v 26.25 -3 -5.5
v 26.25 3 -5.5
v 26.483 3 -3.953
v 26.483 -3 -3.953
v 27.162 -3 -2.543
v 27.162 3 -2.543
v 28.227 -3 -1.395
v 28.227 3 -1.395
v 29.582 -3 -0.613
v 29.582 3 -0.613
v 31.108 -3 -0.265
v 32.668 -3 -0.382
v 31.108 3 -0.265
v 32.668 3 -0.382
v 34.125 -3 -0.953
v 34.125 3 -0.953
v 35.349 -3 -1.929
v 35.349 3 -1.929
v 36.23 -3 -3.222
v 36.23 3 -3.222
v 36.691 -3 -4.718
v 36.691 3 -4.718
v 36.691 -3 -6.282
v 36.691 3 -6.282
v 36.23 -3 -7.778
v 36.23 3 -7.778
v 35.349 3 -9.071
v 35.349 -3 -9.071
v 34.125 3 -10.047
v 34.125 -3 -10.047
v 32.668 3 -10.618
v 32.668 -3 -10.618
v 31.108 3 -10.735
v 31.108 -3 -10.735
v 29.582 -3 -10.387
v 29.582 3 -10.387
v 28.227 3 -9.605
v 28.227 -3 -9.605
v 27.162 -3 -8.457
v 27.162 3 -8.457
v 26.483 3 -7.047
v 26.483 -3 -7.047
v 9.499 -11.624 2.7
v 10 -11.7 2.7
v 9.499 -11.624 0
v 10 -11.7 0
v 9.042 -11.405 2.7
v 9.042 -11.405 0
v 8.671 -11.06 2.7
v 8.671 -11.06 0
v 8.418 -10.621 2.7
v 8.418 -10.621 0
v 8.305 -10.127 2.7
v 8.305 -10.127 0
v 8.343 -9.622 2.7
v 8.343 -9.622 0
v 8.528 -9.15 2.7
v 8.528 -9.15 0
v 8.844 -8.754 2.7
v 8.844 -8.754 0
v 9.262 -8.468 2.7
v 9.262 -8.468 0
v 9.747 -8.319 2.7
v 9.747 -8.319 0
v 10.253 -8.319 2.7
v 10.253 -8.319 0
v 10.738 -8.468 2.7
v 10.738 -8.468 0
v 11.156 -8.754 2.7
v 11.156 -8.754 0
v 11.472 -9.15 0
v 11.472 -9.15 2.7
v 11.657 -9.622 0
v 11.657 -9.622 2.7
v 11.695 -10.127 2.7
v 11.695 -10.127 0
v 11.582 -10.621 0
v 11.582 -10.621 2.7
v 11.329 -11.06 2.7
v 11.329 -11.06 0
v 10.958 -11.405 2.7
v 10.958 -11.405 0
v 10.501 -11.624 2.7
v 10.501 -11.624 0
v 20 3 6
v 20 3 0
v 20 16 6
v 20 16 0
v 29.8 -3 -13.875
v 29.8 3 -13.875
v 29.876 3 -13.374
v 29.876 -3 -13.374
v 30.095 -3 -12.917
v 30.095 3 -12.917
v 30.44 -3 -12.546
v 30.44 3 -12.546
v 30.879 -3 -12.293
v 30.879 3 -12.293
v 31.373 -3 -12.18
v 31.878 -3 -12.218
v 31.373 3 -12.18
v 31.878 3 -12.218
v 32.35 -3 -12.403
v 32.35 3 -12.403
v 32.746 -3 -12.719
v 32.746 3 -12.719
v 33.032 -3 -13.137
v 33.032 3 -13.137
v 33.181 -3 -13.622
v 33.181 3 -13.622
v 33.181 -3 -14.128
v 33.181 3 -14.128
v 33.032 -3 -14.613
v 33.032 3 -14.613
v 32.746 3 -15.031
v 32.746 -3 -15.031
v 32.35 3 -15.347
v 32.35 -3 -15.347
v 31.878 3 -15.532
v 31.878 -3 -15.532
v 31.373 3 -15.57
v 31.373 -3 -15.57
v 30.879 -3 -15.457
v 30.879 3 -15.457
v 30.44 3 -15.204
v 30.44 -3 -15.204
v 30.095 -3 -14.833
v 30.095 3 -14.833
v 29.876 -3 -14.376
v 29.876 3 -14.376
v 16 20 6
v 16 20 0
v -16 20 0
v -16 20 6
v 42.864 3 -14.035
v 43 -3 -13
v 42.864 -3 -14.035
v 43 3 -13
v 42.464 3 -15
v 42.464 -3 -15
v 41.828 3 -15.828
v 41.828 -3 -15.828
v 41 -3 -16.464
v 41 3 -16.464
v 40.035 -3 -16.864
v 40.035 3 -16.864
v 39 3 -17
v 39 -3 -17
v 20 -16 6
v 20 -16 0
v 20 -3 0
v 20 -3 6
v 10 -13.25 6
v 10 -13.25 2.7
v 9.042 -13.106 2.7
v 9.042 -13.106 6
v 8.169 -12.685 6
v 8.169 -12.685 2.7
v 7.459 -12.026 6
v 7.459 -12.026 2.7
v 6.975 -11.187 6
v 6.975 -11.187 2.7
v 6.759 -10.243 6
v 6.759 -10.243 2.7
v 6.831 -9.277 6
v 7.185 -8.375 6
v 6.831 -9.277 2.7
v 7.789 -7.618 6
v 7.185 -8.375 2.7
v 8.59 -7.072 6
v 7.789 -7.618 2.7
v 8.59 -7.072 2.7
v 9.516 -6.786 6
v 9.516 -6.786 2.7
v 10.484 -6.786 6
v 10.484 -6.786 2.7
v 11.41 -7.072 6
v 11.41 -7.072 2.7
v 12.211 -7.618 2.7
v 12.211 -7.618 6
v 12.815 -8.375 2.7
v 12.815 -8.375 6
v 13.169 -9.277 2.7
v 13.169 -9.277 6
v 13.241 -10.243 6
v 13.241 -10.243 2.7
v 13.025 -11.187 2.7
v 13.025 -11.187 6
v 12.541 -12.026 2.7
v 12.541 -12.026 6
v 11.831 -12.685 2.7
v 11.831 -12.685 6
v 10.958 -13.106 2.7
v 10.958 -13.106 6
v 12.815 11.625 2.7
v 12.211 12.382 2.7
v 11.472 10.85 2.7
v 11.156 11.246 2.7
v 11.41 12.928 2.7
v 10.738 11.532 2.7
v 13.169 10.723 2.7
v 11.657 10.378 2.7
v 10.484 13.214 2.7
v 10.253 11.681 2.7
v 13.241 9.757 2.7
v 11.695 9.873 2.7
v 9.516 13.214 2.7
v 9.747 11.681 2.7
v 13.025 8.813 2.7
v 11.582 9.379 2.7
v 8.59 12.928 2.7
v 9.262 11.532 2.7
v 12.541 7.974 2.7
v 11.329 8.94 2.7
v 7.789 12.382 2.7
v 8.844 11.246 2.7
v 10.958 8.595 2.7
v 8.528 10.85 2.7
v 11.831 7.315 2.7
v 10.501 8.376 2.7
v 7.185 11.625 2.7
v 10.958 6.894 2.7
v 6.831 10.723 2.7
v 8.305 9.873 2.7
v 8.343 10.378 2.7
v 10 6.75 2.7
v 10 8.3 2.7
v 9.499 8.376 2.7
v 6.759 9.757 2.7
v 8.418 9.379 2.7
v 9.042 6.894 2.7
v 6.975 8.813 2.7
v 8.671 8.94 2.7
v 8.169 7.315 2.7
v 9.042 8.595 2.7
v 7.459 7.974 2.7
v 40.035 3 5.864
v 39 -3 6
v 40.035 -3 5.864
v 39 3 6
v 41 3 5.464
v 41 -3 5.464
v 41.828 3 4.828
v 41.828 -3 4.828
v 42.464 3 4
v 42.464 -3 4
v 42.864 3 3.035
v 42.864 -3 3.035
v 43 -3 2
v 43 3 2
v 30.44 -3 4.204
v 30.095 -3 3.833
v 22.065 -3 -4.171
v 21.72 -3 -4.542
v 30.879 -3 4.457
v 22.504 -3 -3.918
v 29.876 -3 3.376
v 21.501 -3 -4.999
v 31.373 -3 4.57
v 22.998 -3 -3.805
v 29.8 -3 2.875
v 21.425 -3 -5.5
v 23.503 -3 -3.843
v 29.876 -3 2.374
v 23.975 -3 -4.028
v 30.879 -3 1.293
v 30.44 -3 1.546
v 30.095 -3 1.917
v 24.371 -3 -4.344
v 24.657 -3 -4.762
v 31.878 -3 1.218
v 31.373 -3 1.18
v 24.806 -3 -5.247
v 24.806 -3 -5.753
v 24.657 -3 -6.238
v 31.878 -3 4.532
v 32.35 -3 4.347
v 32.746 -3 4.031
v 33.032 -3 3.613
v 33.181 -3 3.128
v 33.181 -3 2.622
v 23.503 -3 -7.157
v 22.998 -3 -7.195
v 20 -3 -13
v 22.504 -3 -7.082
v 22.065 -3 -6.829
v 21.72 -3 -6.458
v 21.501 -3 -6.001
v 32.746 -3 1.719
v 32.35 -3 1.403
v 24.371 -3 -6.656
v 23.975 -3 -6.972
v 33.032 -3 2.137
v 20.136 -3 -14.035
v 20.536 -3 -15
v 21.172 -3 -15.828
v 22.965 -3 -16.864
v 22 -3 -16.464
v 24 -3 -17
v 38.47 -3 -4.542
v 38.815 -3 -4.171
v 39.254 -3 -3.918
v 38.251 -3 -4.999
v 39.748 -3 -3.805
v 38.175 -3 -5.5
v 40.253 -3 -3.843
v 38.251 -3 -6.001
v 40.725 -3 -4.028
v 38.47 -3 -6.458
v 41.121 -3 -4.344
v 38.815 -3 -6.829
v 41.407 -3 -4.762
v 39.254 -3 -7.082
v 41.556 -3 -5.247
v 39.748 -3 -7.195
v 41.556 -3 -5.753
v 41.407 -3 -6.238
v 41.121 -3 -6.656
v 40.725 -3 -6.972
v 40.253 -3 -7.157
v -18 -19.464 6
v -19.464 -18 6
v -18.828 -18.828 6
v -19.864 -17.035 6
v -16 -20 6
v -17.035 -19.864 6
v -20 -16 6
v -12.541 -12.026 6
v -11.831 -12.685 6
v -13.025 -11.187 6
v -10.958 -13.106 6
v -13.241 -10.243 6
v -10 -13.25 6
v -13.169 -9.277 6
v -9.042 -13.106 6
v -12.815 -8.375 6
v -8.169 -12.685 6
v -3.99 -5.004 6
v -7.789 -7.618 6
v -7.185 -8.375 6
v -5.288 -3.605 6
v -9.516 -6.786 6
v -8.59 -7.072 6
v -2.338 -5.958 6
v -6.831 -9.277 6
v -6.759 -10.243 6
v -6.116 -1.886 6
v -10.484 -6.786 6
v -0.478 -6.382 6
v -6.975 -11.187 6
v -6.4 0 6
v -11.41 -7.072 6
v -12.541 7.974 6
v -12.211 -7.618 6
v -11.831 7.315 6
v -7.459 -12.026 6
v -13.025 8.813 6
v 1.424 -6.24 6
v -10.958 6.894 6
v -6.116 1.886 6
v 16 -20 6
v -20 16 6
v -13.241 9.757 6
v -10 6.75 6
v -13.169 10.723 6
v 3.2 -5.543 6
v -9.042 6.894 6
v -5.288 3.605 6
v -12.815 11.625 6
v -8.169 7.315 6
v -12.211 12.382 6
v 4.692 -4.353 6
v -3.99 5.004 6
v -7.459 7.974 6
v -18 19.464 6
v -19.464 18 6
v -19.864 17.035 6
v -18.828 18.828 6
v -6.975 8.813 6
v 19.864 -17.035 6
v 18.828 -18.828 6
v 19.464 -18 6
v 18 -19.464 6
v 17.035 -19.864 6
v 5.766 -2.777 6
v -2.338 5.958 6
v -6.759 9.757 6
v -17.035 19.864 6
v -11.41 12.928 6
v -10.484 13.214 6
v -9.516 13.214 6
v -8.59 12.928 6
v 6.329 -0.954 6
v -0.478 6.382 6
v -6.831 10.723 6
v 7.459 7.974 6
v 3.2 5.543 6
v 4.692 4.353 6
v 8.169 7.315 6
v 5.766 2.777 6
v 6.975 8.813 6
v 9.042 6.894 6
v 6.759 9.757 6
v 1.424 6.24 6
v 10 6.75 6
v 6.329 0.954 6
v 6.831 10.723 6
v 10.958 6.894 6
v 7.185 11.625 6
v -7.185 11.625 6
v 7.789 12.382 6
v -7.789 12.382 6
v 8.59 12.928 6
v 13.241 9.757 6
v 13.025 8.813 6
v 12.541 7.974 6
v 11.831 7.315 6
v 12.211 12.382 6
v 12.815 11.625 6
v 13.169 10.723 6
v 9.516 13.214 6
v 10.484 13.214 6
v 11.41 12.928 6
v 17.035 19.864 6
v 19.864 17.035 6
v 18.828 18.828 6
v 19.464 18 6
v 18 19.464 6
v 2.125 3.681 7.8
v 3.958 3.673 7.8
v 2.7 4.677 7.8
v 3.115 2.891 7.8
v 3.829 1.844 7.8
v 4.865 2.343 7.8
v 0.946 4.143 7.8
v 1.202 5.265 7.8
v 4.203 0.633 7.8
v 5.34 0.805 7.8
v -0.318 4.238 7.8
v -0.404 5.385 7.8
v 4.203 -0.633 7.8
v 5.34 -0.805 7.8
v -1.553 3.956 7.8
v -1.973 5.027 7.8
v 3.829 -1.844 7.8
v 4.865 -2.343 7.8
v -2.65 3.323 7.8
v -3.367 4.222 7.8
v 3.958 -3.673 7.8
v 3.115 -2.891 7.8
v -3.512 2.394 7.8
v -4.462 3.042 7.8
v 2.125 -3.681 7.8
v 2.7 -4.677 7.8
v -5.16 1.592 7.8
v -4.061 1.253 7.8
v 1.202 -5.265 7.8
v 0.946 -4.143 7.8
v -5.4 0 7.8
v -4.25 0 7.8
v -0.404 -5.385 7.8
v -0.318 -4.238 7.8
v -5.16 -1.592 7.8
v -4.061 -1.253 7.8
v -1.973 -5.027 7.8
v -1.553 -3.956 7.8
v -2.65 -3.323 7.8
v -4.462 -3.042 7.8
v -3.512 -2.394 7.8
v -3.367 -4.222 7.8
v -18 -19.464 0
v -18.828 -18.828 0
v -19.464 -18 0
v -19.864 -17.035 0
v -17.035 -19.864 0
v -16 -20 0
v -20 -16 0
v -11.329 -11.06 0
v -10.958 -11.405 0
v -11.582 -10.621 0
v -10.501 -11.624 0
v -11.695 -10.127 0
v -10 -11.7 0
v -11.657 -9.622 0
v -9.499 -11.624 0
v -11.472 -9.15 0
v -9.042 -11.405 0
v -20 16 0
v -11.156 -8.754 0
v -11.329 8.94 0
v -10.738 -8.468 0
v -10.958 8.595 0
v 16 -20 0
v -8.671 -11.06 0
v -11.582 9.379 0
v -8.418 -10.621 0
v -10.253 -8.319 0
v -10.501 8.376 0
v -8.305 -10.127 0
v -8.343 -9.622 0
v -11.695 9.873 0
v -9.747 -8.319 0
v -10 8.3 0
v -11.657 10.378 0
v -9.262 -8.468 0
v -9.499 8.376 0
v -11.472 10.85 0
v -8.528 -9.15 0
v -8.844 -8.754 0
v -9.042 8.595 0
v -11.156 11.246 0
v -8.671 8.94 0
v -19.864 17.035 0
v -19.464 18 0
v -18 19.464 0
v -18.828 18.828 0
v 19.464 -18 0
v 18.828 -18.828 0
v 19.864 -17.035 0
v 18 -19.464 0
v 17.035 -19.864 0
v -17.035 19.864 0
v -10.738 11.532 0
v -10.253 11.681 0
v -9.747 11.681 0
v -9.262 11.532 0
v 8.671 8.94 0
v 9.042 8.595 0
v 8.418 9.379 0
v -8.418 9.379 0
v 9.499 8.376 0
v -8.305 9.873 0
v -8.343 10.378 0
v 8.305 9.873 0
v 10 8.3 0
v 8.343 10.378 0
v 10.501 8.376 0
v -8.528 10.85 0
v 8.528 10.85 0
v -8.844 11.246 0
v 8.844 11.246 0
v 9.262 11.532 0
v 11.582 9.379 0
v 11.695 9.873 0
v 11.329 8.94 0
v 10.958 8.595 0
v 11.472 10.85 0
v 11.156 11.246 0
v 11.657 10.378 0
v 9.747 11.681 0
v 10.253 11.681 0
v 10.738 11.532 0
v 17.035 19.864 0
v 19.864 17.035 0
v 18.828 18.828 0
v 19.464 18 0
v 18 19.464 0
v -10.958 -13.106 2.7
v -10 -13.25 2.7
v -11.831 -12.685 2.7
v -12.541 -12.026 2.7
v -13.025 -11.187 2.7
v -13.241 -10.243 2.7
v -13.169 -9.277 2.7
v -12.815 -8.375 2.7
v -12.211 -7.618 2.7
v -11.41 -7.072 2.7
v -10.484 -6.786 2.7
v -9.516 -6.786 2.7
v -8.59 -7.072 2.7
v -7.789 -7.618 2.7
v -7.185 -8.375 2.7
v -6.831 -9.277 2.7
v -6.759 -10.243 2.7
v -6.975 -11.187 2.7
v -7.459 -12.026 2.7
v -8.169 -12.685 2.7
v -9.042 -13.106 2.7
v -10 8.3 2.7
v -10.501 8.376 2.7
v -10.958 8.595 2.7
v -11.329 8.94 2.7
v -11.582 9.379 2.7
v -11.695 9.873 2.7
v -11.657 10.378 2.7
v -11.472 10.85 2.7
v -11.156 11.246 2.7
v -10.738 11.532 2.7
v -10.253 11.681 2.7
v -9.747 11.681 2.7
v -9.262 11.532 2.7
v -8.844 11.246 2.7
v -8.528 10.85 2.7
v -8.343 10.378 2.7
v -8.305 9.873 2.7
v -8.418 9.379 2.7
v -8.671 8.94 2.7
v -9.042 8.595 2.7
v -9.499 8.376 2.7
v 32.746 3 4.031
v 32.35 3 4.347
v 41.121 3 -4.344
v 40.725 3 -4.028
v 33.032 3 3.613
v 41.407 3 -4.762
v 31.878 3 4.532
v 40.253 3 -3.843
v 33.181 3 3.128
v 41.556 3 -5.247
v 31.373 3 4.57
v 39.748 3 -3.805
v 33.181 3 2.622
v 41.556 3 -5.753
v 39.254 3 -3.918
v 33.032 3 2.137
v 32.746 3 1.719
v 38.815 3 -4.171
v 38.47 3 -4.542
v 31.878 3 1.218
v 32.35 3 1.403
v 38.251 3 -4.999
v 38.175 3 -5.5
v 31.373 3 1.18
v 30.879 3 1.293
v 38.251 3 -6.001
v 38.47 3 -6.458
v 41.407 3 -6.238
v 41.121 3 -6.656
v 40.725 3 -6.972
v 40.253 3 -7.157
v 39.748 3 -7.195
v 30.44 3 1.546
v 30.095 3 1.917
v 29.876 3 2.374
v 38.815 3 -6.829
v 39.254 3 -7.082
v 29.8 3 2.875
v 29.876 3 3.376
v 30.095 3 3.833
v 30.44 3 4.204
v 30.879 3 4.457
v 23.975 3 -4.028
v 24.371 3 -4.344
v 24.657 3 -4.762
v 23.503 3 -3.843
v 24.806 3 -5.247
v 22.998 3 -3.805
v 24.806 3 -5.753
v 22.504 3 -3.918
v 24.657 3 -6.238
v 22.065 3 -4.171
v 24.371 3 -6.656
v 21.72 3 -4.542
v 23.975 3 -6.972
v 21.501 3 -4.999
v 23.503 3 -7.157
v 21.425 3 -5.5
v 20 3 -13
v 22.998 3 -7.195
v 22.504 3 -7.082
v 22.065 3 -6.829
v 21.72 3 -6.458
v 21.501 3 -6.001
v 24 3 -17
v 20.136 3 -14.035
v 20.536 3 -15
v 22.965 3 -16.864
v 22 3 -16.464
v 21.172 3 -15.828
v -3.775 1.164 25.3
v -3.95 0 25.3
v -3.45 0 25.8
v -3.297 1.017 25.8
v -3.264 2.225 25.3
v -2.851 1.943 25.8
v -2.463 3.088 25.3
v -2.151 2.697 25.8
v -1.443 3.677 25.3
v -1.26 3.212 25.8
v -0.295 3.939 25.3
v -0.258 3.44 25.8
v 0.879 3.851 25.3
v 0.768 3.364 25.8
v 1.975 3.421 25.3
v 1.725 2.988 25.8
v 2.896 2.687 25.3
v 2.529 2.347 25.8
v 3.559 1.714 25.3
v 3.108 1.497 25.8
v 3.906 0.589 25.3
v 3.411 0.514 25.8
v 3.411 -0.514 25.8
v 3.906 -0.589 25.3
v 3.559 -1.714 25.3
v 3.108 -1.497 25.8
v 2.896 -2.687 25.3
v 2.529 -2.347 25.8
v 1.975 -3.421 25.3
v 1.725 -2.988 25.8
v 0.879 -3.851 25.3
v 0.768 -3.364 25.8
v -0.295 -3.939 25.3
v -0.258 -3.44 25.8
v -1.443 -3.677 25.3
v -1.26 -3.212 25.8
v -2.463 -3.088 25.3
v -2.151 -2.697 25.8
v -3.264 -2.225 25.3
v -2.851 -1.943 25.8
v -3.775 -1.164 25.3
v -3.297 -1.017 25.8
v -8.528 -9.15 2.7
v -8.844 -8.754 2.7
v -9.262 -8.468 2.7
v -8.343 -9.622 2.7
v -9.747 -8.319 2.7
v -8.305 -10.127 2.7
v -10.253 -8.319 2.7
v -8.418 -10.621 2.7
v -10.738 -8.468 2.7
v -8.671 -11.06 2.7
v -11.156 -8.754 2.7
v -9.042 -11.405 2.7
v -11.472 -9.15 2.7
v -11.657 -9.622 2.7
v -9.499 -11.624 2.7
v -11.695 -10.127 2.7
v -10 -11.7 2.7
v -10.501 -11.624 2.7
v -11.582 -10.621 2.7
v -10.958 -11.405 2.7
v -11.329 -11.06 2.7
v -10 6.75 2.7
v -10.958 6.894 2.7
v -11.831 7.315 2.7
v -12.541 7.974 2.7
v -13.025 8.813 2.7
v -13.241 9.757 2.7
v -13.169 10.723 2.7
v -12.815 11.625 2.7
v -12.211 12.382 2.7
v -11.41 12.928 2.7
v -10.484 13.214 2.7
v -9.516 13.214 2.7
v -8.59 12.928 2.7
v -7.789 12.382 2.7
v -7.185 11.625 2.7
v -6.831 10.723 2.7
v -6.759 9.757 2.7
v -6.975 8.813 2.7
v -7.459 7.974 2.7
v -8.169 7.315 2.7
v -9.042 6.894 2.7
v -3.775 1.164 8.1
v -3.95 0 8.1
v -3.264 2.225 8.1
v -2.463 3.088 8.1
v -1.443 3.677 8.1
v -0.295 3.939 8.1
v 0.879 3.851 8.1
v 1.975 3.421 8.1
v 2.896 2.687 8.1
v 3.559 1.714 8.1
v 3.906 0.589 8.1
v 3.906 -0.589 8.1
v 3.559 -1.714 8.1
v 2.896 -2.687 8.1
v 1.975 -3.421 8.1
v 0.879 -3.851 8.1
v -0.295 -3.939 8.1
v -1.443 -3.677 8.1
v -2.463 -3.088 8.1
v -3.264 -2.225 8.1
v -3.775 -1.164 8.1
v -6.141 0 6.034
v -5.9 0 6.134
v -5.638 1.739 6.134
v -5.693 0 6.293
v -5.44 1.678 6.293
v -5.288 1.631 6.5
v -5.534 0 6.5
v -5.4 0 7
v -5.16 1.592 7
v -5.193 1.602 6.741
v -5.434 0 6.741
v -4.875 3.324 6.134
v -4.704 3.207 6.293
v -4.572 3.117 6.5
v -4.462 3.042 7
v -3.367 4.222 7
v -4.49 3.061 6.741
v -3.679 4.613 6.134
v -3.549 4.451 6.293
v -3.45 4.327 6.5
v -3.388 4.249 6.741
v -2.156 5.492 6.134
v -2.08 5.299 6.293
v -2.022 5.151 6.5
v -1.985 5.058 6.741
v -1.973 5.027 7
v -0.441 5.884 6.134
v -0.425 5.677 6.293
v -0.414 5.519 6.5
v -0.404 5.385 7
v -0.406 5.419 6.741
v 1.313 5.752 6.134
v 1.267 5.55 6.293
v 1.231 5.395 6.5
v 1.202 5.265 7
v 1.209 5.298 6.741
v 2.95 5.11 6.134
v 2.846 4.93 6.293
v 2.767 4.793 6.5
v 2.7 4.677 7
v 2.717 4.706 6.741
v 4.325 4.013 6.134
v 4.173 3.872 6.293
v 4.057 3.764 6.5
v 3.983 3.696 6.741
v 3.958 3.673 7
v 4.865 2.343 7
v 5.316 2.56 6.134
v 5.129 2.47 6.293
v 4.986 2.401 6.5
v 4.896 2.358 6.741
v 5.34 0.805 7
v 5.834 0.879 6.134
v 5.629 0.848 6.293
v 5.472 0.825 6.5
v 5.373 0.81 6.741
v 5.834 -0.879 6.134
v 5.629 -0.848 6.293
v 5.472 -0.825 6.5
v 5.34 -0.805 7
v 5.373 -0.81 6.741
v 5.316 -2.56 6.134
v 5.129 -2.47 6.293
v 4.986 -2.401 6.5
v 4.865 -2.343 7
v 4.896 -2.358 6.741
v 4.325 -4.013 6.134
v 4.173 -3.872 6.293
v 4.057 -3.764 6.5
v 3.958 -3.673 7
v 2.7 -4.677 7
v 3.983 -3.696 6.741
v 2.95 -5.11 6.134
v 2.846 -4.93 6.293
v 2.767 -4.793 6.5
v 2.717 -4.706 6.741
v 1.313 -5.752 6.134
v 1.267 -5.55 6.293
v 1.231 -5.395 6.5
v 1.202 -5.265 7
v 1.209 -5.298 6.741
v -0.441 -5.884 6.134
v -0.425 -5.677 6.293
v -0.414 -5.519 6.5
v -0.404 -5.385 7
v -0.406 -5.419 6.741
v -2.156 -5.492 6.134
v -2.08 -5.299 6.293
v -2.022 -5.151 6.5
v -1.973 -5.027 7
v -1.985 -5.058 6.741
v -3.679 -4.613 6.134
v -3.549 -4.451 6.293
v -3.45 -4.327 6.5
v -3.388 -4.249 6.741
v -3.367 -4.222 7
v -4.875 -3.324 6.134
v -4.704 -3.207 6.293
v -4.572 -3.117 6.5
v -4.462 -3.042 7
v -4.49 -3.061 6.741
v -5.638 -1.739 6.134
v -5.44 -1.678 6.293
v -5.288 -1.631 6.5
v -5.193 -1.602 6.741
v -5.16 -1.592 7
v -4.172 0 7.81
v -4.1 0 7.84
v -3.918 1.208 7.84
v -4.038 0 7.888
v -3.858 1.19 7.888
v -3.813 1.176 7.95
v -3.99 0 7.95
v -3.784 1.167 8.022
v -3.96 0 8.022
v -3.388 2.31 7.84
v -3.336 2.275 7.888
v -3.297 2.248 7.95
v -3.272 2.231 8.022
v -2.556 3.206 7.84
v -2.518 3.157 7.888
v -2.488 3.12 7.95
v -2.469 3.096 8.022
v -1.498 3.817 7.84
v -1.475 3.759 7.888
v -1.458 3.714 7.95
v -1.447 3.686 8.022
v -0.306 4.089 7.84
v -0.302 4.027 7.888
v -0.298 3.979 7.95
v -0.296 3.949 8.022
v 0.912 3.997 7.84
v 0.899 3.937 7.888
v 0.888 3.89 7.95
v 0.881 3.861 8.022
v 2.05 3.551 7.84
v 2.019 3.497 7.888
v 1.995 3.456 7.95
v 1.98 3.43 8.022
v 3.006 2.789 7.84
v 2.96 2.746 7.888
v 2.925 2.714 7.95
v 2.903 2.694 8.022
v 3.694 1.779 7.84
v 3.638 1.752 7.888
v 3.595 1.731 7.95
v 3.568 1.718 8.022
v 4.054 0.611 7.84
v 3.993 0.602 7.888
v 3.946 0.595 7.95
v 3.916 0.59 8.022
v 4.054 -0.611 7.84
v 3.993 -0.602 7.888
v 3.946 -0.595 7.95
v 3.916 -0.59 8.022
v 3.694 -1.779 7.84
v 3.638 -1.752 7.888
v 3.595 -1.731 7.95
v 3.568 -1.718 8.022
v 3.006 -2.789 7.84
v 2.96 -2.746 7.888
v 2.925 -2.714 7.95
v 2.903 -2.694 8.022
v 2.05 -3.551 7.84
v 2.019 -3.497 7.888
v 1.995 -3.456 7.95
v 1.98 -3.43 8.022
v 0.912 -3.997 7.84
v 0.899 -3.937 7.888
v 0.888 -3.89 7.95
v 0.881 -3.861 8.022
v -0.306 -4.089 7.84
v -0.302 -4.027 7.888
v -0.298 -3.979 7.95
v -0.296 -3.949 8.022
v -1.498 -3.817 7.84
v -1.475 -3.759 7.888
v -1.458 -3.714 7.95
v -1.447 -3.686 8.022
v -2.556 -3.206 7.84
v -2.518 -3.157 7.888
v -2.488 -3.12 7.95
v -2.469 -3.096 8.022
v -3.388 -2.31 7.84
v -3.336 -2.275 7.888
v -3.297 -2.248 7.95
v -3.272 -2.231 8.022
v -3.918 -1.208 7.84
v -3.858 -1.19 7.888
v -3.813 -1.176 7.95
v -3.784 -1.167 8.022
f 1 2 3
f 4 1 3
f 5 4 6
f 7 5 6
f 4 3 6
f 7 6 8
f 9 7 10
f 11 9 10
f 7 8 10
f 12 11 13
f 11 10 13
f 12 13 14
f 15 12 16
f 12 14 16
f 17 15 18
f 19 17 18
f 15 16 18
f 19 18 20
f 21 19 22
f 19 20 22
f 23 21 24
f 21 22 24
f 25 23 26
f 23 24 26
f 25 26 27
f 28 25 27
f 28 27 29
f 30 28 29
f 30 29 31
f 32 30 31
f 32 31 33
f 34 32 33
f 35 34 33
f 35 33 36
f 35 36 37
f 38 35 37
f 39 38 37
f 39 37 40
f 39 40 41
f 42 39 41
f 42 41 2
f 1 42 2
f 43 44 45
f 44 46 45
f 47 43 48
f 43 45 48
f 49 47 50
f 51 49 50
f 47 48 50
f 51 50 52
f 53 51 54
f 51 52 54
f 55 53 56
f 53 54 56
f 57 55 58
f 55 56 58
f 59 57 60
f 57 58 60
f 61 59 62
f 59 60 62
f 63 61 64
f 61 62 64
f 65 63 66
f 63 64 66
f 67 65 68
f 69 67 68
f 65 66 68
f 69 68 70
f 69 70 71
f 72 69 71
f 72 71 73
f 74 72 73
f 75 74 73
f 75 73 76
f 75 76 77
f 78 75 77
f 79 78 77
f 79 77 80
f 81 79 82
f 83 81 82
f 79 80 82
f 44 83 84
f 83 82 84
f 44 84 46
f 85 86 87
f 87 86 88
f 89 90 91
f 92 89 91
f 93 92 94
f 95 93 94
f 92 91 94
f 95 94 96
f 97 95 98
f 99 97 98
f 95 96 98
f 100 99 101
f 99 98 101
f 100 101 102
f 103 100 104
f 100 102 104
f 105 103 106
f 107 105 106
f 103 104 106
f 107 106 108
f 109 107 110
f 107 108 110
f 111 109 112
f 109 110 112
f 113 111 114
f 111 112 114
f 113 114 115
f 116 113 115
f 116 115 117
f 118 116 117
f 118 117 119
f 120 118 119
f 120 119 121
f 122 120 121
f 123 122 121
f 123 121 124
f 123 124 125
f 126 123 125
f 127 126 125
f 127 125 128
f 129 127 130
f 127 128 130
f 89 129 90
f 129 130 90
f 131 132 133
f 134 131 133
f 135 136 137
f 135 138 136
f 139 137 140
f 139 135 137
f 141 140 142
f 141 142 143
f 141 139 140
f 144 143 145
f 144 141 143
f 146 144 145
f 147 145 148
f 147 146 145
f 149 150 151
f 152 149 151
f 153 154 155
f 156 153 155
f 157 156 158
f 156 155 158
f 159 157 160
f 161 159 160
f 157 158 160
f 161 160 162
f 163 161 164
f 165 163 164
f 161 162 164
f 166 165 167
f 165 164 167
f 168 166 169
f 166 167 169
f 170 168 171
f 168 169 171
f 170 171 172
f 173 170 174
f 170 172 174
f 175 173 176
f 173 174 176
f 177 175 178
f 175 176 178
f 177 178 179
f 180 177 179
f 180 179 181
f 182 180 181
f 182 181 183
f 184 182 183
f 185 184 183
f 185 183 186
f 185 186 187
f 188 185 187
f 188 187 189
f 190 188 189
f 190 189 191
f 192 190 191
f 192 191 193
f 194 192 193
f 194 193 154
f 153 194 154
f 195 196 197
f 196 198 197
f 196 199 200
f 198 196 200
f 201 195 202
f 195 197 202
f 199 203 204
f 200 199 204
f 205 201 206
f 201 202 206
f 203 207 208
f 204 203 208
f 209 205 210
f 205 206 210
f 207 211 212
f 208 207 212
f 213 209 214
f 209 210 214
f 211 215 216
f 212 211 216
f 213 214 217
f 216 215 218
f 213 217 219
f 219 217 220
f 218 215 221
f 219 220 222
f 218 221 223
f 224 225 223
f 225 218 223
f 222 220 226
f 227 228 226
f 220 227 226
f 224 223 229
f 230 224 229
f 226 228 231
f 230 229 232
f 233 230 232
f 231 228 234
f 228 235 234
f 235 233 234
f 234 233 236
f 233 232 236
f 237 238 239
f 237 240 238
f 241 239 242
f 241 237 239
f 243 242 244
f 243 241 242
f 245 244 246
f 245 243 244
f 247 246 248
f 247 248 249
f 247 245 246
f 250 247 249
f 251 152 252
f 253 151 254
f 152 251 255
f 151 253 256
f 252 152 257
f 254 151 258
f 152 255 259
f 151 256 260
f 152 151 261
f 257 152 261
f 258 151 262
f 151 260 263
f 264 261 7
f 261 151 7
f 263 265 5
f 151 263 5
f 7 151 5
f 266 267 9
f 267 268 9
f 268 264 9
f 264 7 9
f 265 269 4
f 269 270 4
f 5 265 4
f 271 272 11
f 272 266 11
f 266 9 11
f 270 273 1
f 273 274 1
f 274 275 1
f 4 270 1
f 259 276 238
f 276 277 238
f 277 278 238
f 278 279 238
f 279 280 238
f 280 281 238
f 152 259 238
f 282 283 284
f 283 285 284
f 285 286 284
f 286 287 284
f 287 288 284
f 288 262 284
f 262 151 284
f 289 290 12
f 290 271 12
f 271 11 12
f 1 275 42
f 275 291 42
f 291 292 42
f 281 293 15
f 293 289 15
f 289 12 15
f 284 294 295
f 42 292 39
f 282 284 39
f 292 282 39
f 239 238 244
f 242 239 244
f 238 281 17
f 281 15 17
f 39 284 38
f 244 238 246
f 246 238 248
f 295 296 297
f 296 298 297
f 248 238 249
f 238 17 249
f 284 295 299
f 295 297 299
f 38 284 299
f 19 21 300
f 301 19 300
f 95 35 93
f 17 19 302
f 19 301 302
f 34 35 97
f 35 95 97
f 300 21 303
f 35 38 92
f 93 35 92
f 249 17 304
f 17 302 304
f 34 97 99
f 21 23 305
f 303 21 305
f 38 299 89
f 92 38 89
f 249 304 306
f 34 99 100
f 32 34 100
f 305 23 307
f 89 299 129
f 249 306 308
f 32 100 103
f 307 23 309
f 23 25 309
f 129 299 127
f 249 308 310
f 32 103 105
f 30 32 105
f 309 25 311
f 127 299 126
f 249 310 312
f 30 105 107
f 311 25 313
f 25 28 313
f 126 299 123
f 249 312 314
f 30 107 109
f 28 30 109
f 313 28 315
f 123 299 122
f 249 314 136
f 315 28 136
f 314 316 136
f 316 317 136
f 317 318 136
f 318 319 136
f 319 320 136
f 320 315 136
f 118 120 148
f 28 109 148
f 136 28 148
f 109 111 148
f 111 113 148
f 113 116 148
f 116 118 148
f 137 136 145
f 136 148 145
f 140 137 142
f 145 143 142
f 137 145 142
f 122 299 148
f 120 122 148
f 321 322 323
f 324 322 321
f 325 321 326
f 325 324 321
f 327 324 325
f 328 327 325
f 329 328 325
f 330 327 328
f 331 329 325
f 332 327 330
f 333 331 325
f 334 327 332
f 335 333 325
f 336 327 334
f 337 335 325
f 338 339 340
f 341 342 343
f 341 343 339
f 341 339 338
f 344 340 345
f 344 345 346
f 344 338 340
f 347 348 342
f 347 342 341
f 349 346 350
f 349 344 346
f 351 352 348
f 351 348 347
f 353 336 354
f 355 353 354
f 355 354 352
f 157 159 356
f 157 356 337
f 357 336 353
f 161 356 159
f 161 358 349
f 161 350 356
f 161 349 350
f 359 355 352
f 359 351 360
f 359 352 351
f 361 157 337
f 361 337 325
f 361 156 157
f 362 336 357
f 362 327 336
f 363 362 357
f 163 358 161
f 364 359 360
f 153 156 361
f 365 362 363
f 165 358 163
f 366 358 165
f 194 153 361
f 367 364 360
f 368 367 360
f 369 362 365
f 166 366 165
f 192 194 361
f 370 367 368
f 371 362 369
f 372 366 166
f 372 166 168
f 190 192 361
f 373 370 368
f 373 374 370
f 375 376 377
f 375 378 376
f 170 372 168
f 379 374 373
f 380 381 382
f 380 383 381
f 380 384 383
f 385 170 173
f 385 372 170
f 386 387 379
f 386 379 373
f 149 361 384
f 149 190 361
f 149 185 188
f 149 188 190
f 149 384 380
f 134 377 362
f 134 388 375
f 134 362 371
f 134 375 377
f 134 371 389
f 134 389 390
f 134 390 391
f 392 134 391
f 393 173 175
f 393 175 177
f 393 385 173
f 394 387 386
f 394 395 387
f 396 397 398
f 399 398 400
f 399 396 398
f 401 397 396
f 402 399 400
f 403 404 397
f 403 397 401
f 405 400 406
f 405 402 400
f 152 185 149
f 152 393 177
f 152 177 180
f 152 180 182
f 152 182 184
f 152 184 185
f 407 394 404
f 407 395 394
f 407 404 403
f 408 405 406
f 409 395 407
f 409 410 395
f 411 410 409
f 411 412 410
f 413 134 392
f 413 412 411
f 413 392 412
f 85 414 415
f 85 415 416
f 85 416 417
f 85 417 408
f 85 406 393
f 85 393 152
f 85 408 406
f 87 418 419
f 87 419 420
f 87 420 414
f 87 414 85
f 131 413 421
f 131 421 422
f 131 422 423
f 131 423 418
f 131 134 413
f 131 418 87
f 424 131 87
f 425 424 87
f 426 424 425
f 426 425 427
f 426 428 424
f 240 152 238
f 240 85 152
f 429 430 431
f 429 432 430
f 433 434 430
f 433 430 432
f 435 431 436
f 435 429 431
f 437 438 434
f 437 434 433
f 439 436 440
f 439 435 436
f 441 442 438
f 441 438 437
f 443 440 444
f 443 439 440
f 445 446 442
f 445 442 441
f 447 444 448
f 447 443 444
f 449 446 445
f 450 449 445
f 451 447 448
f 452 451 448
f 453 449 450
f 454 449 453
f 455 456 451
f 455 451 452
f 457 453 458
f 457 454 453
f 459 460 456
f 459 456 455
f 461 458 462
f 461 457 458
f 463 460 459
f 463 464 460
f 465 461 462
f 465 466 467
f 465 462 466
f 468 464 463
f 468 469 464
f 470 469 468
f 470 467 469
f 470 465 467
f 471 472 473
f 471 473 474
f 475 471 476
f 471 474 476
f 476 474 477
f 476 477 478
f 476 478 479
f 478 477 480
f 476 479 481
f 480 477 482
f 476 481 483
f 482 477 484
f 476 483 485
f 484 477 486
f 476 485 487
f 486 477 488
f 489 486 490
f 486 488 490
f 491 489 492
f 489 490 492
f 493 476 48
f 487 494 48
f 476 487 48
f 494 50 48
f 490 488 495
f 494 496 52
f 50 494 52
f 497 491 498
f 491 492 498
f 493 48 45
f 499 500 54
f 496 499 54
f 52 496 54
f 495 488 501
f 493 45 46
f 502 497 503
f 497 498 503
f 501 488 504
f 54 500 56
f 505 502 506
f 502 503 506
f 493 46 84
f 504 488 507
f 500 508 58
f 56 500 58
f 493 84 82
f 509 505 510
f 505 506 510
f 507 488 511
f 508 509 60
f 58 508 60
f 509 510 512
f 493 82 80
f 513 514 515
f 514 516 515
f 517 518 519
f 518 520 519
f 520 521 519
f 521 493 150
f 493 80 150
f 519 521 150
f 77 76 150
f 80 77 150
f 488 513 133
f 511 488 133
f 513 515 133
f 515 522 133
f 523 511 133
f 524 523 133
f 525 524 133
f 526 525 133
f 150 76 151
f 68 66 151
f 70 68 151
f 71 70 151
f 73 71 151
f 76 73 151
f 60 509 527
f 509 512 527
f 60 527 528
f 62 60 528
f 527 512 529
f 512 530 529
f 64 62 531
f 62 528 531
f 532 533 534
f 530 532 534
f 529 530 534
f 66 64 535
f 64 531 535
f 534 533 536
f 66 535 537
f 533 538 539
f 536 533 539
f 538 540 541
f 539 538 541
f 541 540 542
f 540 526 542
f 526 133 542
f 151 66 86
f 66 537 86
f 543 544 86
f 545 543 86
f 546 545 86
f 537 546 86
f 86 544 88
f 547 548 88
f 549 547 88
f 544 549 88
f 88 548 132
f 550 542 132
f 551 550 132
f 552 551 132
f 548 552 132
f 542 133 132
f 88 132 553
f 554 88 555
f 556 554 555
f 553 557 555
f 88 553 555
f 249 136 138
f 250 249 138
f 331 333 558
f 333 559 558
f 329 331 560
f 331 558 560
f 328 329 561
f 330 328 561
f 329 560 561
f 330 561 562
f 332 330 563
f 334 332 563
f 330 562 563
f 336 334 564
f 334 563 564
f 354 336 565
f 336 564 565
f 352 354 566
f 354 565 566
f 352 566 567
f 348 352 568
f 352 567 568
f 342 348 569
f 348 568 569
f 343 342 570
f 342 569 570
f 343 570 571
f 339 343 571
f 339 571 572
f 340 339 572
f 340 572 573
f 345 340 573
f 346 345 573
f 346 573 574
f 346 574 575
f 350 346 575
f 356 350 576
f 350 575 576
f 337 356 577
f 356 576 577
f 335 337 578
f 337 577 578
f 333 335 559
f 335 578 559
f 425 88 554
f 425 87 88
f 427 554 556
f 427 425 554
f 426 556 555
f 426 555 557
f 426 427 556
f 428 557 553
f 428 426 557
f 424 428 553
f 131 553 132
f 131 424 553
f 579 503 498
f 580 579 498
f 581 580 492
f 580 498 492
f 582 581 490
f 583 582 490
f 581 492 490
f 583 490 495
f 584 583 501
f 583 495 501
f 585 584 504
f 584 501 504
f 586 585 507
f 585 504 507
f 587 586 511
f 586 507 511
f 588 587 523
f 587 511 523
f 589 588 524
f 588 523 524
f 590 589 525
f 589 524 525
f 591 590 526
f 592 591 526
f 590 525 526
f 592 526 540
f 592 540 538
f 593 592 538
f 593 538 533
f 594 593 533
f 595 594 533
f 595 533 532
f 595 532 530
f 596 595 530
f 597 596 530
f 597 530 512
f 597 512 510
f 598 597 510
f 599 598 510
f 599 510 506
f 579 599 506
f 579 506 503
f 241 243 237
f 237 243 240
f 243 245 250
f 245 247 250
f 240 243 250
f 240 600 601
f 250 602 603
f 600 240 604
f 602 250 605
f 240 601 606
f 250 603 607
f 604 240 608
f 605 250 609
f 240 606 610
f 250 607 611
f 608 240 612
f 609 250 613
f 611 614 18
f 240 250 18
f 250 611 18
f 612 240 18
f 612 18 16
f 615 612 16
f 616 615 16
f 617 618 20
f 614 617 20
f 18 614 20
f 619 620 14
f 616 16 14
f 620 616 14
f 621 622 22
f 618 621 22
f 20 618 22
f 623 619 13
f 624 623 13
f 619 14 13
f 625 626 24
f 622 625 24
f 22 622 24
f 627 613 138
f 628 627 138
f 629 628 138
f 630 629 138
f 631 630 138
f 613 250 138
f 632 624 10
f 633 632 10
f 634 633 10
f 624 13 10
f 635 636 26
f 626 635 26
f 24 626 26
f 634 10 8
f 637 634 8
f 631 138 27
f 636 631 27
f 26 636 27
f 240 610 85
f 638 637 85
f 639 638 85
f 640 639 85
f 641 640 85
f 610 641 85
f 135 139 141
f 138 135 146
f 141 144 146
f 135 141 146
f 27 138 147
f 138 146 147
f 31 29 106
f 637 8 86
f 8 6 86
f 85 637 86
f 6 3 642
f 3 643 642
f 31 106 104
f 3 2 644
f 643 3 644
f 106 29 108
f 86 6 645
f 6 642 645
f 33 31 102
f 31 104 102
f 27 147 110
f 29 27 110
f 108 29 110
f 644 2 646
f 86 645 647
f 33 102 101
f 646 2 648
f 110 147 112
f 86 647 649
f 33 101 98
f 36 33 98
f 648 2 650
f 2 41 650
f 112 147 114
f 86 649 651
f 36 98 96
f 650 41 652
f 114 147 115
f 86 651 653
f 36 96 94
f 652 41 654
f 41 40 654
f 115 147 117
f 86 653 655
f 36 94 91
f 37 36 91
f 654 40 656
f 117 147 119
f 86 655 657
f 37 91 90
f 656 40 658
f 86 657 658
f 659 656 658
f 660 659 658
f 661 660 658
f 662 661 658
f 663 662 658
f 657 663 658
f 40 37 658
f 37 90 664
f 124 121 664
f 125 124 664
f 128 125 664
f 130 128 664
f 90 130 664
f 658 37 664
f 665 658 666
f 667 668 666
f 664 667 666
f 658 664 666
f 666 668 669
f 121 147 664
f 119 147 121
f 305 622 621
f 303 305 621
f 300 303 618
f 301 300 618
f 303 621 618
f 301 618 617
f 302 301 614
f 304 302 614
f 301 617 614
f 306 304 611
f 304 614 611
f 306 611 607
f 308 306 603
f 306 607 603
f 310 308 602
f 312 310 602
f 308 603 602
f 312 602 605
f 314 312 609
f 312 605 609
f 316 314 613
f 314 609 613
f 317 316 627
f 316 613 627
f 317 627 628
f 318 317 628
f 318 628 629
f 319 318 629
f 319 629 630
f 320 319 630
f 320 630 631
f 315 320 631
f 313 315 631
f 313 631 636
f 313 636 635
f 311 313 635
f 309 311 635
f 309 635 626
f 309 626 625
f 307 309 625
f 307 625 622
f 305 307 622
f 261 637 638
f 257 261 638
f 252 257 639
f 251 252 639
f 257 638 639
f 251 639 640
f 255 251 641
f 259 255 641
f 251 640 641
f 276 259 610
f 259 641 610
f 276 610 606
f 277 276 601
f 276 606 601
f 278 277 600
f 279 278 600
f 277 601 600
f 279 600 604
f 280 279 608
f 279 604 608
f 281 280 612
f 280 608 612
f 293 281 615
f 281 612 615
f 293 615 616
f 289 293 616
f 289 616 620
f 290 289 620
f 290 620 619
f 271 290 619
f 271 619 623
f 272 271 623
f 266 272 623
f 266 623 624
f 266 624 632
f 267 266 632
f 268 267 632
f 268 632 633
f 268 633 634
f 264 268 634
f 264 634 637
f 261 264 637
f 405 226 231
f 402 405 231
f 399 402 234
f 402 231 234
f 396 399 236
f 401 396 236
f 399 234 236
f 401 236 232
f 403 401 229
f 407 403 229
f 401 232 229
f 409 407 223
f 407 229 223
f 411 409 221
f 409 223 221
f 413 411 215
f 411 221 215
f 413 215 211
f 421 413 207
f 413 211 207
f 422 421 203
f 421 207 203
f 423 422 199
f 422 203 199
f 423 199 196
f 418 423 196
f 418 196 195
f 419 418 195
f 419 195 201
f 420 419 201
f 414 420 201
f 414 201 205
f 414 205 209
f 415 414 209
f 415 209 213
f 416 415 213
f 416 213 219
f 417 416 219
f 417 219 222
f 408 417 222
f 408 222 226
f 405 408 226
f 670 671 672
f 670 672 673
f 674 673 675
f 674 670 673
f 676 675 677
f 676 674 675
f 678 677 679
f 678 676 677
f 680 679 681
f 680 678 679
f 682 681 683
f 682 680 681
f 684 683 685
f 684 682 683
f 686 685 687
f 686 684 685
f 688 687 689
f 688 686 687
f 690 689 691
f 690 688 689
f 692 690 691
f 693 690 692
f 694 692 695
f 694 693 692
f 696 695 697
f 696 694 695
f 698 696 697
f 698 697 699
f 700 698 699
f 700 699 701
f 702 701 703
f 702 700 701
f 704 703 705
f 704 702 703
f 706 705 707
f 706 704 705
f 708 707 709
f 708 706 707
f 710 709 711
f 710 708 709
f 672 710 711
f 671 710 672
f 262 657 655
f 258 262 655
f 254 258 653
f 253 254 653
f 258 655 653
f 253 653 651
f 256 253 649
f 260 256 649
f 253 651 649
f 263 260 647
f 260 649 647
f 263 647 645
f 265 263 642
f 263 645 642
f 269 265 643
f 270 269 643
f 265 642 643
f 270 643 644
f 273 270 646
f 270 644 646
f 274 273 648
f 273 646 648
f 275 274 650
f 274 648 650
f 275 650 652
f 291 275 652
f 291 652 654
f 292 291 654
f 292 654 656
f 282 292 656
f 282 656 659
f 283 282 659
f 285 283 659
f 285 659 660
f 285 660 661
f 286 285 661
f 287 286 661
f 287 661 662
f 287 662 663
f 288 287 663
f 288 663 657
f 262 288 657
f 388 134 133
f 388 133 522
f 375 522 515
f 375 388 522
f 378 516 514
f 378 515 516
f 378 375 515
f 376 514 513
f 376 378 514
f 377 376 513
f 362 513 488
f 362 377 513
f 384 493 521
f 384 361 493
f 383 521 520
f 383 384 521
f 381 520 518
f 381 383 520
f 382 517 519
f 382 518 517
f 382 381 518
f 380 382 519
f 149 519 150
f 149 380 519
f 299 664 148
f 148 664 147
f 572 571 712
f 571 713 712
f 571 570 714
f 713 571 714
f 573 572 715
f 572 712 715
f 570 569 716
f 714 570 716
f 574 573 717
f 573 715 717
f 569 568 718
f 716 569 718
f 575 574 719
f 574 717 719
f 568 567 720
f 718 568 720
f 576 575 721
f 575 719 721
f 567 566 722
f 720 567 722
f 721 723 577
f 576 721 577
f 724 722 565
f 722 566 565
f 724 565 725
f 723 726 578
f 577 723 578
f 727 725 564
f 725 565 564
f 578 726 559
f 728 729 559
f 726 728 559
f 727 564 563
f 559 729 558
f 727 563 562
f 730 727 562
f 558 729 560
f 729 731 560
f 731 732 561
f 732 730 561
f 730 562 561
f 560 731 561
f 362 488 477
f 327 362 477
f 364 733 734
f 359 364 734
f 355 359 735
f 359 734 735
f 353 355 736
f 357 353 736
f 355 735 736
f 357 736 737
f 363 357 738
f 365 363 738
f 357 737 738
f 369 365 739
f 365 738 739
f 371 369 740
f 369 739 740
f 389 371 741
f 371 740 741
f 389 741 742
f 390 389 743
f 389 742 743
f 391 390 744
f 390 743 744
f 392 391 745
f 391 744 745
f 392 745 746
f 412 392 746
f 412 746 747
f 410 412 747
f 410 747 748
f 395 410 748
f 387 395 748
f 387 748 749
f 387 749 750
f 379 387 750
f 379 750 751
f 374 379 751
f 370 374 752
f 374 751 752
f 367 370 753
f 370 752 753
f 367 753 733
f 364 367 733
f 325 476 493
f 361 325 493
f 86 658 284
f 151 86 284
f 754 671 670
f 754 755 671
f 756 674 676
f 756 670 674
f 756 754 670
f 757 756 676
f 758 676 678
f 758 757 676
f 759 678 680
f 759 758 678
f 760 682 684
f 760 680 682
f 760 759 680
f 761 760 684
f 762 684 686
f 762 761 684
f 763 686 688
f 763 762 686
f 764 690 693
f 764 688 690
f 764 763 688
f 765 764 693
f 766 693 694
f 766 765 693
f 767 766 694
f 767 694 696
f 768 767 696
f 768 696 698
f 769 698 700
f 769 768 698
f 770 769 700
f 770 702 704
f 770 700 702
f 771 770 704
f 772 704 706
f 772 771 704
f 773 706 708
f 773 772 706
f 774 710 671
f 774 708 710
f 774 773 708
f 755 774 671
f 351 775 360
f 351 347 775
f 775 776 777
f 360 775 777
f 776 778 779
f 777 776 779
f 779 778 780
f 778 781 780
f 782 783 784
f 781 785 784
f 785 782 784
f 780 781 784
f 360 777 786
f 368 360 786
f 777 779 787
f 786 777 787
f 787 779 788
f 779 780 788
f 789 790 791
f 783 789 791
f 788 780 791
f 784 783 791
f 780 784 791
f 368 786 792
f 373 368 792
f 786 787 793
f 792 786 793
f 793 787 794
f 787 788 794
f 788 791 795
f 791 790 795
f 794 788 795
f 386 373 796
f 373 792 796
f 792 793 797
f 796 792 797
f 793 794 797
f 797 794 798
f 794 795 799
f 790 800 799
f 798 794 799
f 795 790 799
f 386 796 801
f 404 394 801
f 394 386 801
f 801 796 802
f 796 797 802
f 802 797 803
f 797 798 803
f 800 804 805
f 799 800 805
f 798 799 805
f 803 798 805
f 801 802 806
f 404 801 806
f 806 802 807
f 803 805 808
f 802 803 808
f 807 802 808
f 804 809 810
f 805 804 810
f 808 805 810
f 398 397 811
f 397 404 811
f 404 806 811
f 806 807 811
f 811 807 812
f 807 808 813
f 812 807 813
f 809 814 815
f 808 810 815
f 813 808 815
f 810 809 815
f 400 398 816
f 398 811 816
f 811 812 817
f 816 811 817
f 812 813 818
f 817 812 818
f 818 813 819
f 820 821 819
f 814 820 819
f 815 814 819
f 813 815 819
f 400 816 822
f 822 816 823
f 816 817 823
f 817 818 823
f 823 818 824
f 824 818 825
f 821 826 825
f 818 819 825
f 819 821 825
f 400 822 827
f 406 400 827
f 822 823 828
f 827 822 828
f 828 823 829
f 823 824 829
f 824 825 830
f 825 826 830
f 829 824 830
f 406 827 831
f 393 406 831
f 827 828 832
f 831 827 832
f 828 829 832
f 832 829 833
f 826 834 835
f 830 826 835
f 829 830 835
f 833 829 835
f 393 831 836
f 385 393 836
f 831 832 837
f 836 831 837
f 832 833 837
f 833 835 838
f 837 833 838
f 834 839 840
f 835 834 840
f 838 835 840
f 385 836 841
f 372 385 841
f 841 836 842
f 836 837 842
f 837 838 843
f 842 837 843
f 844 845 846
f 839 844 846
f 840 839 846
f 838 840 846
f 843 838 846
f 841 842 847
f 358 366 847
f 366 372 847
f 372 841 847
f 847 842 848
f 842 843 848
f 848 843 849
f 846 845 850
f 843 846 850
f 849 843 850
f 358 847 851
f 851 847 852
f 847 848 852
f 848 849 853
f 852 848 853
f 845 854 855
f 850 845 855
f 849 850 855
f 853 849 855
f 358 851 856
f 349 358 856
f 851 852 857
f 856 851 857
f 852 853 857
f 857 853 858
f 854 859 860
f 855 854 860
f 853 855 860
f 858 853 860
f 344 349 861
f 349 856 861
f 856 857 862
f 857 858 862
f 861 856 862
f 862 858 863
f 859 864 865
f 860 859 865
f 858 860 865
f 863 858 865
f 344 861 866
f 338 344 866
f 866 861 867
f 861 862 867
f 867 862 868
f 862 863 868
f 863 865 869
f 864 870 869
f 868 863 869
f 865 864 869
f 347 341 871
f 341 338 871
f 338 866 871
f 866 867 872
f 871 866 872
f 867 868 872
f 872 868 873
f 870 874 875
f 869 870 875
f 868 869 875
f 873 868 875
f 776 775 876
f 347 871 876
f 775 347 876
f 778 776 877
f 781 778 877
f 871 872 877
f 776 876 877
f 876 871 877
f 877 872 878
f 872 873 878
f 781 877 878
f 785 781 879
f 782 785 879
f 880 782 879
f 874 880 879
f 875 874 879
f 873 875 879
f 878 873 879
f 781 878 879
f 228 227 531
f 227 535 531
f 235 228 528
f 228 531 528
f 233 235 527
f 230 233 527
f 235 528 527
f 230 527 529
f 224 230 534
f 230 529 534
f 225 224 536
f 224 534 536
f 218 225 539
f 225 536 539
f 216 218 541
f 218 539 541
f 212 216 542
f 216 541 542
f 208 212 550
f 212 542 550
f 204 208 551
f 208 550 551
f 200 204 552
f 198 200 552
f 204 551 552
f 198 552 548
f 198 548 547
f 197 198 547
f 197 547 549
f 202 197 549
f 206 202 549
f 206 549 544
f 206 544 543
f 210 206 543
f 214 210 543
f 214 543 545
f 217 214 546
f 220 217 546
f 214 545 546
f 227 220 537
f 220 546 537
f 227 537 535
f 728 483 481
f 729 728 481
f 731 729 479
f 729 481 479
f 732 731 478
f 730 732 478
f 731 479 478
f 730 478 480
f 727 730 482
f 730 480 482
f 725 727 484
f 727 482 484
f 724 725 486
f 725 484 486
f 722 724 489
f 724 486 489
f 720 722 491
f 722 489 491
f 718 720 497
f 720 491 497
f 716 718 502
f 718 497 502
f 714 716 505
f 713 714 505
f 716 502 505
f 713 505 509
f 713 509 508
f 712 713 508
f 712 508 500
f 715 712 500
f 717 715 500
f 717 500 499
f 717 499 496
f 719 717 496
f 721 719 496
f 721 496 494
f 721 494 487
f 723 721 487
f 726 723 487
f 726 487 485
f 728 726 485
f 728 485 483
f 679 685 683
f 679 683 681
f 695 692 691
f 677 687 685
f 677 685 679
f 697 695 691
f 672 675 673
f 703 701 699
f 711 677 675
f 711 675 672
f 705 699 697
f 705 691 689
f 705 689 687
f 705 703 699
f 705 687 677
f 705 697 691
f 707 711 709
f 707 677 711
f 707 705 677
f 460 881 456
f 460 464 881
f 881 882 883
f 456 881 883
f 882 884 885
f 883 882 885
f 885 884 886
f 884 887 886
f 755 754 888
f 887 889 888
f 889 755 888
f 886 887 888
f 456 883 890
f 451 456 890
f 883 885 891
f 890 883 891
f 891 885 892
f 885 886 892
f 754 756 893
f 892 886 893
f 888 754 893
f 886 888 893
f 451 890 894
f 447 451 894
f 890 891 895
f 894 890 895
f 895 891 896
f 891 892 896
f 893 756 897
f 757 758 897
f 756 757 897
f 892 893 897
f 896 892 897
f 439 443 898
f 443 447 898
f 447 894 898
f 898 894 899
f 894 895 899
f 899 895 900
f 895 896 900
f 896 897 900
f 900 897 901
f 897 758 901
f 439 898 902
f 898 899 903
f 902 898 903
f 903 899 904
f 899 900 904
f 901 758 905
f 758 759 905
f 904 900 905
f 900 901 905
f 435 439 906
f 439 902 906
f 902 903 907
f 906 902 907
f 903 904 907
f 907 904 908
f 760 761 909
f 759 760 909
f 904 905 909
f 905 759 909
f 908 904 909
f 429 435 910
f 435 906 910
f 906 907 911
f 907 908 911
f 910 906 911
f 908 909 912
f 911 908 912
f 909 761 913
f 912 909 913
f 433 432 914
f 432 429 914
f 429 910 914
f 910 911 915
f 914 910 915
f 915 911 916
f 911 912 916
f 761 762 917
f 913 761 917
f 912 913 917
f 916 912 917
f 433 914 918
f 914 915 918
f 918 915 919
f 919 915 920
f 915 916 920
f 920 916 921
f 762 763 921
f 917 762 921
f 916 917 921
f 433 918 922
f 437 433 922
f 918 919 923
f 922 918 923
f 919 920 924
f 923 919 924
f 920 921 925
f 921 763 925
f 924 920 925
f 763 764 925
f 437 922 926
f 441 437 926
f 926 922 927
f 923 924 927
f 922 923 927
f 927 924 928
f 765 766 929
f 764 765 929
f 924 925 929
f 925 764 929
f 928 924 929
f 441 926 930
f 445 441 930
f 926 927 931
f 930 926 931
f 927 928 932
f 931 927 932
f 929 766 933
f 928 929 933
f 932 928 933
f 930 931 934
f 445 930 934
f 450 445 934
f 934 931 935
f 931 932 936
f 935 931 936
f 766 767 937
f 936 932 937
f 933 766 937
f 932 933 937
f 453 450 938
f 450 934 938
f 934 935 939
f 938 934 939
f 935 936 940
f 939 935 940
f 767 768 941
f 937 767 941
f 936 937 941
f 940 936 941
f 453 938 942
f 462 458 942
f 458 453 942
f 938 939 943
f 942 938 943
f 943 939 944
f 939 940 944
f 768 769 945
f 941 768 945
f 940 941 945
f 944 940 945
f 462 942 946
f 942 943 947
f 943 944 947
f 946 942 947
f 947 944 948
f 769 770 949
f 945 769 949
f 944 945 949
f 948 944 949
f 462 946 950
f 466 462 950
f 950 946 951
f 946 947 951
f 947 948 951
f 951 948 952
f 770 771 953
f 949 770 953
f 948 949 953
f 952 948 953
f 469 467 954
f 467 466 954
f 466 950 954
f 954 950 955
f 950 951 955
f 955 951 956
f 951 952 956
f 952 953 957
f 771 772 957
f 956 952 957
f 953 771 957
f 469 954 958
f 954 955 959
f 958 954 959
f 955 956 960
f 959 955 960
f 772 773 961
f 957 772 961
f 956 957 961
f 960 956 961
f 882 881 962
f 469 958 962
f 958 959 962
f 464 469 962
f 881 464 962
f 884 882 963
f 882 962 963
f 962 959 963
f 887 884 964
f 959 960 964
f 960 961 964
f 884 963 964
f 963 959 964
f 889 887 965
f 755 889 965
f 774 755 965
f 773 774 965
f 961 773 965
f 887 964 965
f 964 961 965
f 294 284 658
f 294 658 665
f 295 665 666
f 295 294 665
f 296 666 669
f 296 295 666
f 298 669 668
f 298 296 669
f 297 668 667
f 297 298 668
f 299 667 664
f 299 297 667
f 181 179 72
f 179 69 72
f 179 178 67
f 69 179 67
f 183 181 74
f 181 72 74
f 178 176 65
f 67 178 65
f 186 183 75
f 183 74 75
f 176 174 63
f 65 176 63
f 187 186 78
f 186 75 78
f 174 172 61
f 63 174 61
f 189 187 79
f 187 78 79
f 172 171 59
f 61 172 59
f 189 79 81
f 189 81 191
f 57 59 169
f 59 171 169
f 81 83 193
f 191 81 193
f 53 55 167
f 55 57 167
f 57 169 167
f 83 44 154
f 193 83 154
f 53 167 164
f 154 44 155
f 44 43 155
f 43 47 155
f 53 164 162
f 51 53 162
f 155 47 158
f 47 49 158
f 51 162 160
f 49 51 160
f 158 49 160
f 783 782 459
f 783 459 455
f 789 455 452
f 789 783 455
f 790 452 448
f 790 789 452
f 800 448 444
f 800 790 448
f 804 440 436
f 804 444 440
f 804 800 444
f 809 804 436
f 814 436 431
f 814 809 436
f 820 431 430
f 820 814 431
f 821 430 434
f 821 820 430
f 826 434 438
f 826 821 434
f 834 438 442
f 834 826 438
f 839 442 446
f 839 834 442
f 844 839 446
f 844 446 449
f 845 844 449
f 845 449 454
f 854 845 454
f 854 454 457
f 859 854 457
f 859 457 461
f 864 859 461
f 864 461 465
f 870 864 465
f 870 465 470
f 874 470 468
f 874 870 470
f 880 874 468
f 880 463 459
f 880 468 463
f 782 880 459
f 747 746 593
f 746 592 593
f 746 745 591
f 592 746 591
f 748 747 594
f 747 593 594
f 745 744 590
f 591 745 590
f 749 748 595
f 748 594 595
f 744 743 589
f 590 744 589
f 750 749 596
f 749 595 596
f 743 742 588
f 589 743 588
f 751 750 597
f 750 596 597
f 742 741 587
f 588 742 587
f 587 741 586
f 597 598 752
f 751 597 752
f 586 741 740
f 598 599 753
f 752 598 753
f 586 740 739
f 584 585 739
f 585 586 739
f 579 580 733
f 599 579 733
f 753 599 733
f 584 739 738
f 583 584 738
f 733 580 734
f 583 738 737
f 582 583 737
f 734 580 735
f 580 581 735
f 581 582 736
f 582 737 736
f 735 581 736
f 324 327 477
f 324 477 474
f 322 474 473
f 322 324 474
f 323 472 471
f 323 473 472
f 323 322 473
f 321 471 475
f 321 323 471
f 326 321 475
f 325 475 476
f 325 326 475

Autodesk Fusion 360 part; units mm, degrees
sketch "草图1" plane through (0, 0, 0) normal (0, 0, 1) x (1, 0, 0)
  line L0 (20, 20) -> (-20, 20)
  line L1 (-20, 20) -> (-20, -20)
  line L2 (-20, -20) -> (20, -20)
  line L3 (20, -20) -> (20, 20)
  line L4 (20, 20) -> (-20, -20) construction
  line L5 (-20, 20) -> (20, -20) construction
  dimension "d25" = 40
  dimension "d26" = 40
extrude "拉伸1" add sketch "草图1" along normal blind 6
fillet "圆角1" radius 4 4 edges at (-20, -20, 3) (20, -20, 3) (20, 20, 3) (-20, 20, 3)
sketch "草图2" plane through (0, 0, 6) normal (0, 0, 1) x (-1, 0, 0)
  arc A0 (16, -20) -> (20, -16) centre (16, -16) ccw
  line L0 (20, -16) -> (20, 16)
  arc A1 (20, 16) -> (16, 20) centre (16, 16) ccw
  line L1 (16, 20) -> (-16, 20)
  arc A2 (-16, 20) -> (-20, 16) centre (-16, 16) ccw
  line L2 (-20, 16) -> (-20, -16)
  arc A3 (-20, -16) -> (-16, -20) centre (-16, -16) ccw
  line L3 (-16, -20) -> (16, -20)
  point P0 (-10, -10)
  dimension "d31" = 10
  dimension "d32" = 10
hole "孔1" at (10, 10, 6) direction (0, 0, -1) diameter 3.4 depth 15 tip angle 118 counterbore diameter 6.5 counterbore depth 3.3
pattern_linear "R-阵列1" count 2 spacing 20 along (-1, 0, 0) count 2 spacing 20 along (0, -1, 0) of "孔1"
sketch "草图3" plane through (0, 0, 6) normal (0, 0, 1) x (-1, 0, 0)
  circle A0 centre (10, 10) radius 3.25
  circle A1 centre (-10, 10) radius 3.25
  circle A2 centre (10, -10) radius 3.25
  circle A3 centre (-10, -10) radius 3.25
  arc A4 (16, -20) -> (20, -16) centre (16, -16) ccw
  line L0 (20, -16) -> (20, 16)
  arc A5 (20, 16) -> (16, 20) centre (16, 16) ccw
  line L1 (16, 20) -> (-16, 20)
  arc A6 (-16, 20) -> (-20, 16) centre (-16, 16) ccw
  line L2 (-20, 16) -> (-20, -16)
  arc A7 (-20, -16) -> (-16, -20) centre (-16, -16) ccw
  line L3 (-16, -20) -> (16, -20)
  circle A8 centre (0, 0) radius 5.4
  dimension "d42" = 10.8
extrude "拉伸2" add sketch "草图3" along normal blind 1.8 contours A8
fillet "圆角2" radius 1 1 edges at (5.0346, -1.9527, 6)
sketch "草图4" plane through (0, 0, 7.8) normal (0, 0, 1) x (-1, 0, 0)
  circle A0 centre (0, 0) radius 5.4
  circle A1 centre (0, 0) radius 3.95
  dimension "d47" = 7.9
extrude "拉伸3" add sketch "草图4" along normal blind 18 contours A1
fillet "圆角3" radius 0.3 1 edges at (3.6827, -1.4284, 7.8)
chamfer "倒角1" distance 0.5 angle 45 1 edges at (3.6827, 1.4284, 25.8)
sketch "草图5" plane through (0, 0, 0) normal (0, 1, 0) x (1, 0, 0)
sketch "草图6" plane through (0, 0, 0) normal (0, 0, 1) x (1, 0, 0)
  line L0 (20, -3) -> (43, -3)
  line L1 (43, -3) -> (43, 3)
  line L2 (43, 3) -> (20, 3)
  line L3 (20, 3) -> (20, -3)
extrude "拉伸4" add sketch "草图6" along normal blind 6 and the other way blind 17
sketch "草图7" plane through (0, 3, 0) normal (0, 1, 0) x (-1, 0, 0)
  line L0 (-20, 0) -> (-20, 6)
  line L1 (-20, 6) -> (-43, 6)
  line L2 (-43, 6) -> (-43, -17)
  line L3 (-43, -17) -> (-20, -17)
  line L4 (-20, -17) -> (-20, 0)
  circle A0 centre (-31.5, -5.5) radius 5.25
  line L5 (0, 20) -> (0, 2.5)
  dimension "d57" = 10.5
  dimension "d58" = 31.5
  dimension "d59" = 11.5
extrude "拉伸5" cut sketch "草图7" against normal blind 6 contours A0
sketch "草图8" plane through (0, 3, 0) normal (0, 1, 0) x (-1, 0, 0)
  circle A0 centre (-31.5, -5.5) radius 5.25
  line L0 (-20, 0) -> (-20, 6)
  line L1 (-20, 6) -> (-43, 6)
  line L2 (-43, 6) -> (-43, -17)
  line L3 (-43, -17) -> (-20, -17)
  line L4 (-20, -17) -> (-20, 0)
  circle A1 centre (-31.5, 2.875) radius 1.7
  circle A2 centre (-31.5, -13.875) radius 1.7
  circle A3 centre (-39.875, -5.5) radius 1.7
  circle A4 centre (-23.125, -5.5) radius 1.7
  dimension "d62" = 3.4
  dimension "d64" = 3.125
  dimension "d67" = 11.5
  dimension "d68" = 3.4
  dimension "d69" = 3.125
  dimension "d70" = 11.5
  dimension "d71" = 3.4
  dimension "d72" = 3.4
  dimension "d73" = 3.125
  dimension "d74" = 3.125
  dimension "d75" = 11.5
  dimension "d76" = 11.5
extrude "拉伸7" cut sketch "草图8" against normal blind 6 contours A1 | A2 | A3 | A4
fillet "圆角4" radius 4 3 edges at (43, 0, 6) (43, 0, -17) (20, 0, -17)
equation "Base_Length = 40 mm" comment "Base length"
equation "Base_Width = 40 mm" comment "Base width"
equation "Base_Thickness = 6 mm" comment "Base thickness"
equation "Base_Corner_Radius = 4 mm" comment "Base corner radius"
equation "Hole_Pitch_X = 20 mm" comment "M3 hole pitch X"
equation "Hole_Pitch_Y = 20 mm" comment "M3 hole pitch Y"
equation "M3_Clearance_Diameter = 3.4 mm" comment "M3 clearance hole diameter"
equation "Counterbore_Diameter = 6.5 mm" comment "M3 socket-head counterbore diameter"
equation "Counterbore_Depth = 3.3 mm" comment "M3 counterbore depth"
equation "Shaft_Diameter = 7.9 mm" comment "Vertical printed shaft diameter"
equation "Shoulder_Diameter = 10.8 mm" comment "Bearing inner-ring support shoulder diameter"
equation "Shoulder_Height = 1.8 mm" comment "Bearing shoulder height"
equation "Shaft_Height = 18 mm" comment "Shaft height above shoulder"
equation "Shoulder_Base_Fillet = 1 mm" comment "Fillet between shoulder and base"
equation "Shaft_Shoulder_Fillet = 0.3 mm" comment "Small fillet between shaft and shoulder"
equation "Shaft_Top_Chamfer = 0.5 mm" comment "Shaft top lead-in chamfer"
equation "Bearing_Width = 7 mm" comment "608 bearing width"
equation "Bearing_Stack_Width = Bearing_Width * 2" comment "Two 608 bearings total width"
equation "Top_Retention_Hole_Diameter = 2.2 mm" comment "Transverse retention hole diameter"
equation "Top_Retention_Hole_Height = 15.5 mm" comment "Hole center height above shoulder"
equation "Axial_Clearance_Target = 0.6 mm" comment "Target axial play under retention pin"
equation "Bearing_ID = 8 mm" comment "608 bearing nominal inner diameter"
equation "Bearing_OD = 22 mm" comment "608 bearing nominal outer diameter"
equation "Wheel_Base_Clearance_Target = 1.5 mm" comment "Target wheel-to-base clearance"
equation "d25 = Base_Length"
equation "d26 = Base_Width"
equation "d27 = Base_Thickness"
equation "d30 = Base_Corner_Radius"
equation "d31 = ( Base_Length - Hole_Pitch_X ) / 2"
equation "d32 = ( Base_Width - Hole_Pitch_Y ) / 2"
equation "d34 = M3_Clearance_Diameter"
equation "d36 = Counterbore_Depth"
equation "d37 = Counterbore_Diameter"
equation "d40 = Hole_Pitch_X"
equation "d41 = Hole_Pitch_Y"
equation "d42 = Shoulder_Diameter"
equation "d43 = Shoulder_Height"
equation "d46 = Shoulder_Base_Fillet"
equation "d47 = Shaft_Diameter"
equation "d48 = Shaft_Height"
equation "d51 = Shaft_Shoulder_Fillet"
equation "d52 = Shaft_Top_Chamfer"
equation "d58 = ( 23 / 2 ) * 1 mm + 20 mm"
equation "d59 = ( 23 / 2 ) * 1 mm"
equation "d64 = ( ( 23 / 2 - 10.5 / 2 ) / 2 ) * 1 mm"
equation "d67 = ( 23 / 2 ) * 1 mm"
equation "d80 = Base_Corner_Radius"
